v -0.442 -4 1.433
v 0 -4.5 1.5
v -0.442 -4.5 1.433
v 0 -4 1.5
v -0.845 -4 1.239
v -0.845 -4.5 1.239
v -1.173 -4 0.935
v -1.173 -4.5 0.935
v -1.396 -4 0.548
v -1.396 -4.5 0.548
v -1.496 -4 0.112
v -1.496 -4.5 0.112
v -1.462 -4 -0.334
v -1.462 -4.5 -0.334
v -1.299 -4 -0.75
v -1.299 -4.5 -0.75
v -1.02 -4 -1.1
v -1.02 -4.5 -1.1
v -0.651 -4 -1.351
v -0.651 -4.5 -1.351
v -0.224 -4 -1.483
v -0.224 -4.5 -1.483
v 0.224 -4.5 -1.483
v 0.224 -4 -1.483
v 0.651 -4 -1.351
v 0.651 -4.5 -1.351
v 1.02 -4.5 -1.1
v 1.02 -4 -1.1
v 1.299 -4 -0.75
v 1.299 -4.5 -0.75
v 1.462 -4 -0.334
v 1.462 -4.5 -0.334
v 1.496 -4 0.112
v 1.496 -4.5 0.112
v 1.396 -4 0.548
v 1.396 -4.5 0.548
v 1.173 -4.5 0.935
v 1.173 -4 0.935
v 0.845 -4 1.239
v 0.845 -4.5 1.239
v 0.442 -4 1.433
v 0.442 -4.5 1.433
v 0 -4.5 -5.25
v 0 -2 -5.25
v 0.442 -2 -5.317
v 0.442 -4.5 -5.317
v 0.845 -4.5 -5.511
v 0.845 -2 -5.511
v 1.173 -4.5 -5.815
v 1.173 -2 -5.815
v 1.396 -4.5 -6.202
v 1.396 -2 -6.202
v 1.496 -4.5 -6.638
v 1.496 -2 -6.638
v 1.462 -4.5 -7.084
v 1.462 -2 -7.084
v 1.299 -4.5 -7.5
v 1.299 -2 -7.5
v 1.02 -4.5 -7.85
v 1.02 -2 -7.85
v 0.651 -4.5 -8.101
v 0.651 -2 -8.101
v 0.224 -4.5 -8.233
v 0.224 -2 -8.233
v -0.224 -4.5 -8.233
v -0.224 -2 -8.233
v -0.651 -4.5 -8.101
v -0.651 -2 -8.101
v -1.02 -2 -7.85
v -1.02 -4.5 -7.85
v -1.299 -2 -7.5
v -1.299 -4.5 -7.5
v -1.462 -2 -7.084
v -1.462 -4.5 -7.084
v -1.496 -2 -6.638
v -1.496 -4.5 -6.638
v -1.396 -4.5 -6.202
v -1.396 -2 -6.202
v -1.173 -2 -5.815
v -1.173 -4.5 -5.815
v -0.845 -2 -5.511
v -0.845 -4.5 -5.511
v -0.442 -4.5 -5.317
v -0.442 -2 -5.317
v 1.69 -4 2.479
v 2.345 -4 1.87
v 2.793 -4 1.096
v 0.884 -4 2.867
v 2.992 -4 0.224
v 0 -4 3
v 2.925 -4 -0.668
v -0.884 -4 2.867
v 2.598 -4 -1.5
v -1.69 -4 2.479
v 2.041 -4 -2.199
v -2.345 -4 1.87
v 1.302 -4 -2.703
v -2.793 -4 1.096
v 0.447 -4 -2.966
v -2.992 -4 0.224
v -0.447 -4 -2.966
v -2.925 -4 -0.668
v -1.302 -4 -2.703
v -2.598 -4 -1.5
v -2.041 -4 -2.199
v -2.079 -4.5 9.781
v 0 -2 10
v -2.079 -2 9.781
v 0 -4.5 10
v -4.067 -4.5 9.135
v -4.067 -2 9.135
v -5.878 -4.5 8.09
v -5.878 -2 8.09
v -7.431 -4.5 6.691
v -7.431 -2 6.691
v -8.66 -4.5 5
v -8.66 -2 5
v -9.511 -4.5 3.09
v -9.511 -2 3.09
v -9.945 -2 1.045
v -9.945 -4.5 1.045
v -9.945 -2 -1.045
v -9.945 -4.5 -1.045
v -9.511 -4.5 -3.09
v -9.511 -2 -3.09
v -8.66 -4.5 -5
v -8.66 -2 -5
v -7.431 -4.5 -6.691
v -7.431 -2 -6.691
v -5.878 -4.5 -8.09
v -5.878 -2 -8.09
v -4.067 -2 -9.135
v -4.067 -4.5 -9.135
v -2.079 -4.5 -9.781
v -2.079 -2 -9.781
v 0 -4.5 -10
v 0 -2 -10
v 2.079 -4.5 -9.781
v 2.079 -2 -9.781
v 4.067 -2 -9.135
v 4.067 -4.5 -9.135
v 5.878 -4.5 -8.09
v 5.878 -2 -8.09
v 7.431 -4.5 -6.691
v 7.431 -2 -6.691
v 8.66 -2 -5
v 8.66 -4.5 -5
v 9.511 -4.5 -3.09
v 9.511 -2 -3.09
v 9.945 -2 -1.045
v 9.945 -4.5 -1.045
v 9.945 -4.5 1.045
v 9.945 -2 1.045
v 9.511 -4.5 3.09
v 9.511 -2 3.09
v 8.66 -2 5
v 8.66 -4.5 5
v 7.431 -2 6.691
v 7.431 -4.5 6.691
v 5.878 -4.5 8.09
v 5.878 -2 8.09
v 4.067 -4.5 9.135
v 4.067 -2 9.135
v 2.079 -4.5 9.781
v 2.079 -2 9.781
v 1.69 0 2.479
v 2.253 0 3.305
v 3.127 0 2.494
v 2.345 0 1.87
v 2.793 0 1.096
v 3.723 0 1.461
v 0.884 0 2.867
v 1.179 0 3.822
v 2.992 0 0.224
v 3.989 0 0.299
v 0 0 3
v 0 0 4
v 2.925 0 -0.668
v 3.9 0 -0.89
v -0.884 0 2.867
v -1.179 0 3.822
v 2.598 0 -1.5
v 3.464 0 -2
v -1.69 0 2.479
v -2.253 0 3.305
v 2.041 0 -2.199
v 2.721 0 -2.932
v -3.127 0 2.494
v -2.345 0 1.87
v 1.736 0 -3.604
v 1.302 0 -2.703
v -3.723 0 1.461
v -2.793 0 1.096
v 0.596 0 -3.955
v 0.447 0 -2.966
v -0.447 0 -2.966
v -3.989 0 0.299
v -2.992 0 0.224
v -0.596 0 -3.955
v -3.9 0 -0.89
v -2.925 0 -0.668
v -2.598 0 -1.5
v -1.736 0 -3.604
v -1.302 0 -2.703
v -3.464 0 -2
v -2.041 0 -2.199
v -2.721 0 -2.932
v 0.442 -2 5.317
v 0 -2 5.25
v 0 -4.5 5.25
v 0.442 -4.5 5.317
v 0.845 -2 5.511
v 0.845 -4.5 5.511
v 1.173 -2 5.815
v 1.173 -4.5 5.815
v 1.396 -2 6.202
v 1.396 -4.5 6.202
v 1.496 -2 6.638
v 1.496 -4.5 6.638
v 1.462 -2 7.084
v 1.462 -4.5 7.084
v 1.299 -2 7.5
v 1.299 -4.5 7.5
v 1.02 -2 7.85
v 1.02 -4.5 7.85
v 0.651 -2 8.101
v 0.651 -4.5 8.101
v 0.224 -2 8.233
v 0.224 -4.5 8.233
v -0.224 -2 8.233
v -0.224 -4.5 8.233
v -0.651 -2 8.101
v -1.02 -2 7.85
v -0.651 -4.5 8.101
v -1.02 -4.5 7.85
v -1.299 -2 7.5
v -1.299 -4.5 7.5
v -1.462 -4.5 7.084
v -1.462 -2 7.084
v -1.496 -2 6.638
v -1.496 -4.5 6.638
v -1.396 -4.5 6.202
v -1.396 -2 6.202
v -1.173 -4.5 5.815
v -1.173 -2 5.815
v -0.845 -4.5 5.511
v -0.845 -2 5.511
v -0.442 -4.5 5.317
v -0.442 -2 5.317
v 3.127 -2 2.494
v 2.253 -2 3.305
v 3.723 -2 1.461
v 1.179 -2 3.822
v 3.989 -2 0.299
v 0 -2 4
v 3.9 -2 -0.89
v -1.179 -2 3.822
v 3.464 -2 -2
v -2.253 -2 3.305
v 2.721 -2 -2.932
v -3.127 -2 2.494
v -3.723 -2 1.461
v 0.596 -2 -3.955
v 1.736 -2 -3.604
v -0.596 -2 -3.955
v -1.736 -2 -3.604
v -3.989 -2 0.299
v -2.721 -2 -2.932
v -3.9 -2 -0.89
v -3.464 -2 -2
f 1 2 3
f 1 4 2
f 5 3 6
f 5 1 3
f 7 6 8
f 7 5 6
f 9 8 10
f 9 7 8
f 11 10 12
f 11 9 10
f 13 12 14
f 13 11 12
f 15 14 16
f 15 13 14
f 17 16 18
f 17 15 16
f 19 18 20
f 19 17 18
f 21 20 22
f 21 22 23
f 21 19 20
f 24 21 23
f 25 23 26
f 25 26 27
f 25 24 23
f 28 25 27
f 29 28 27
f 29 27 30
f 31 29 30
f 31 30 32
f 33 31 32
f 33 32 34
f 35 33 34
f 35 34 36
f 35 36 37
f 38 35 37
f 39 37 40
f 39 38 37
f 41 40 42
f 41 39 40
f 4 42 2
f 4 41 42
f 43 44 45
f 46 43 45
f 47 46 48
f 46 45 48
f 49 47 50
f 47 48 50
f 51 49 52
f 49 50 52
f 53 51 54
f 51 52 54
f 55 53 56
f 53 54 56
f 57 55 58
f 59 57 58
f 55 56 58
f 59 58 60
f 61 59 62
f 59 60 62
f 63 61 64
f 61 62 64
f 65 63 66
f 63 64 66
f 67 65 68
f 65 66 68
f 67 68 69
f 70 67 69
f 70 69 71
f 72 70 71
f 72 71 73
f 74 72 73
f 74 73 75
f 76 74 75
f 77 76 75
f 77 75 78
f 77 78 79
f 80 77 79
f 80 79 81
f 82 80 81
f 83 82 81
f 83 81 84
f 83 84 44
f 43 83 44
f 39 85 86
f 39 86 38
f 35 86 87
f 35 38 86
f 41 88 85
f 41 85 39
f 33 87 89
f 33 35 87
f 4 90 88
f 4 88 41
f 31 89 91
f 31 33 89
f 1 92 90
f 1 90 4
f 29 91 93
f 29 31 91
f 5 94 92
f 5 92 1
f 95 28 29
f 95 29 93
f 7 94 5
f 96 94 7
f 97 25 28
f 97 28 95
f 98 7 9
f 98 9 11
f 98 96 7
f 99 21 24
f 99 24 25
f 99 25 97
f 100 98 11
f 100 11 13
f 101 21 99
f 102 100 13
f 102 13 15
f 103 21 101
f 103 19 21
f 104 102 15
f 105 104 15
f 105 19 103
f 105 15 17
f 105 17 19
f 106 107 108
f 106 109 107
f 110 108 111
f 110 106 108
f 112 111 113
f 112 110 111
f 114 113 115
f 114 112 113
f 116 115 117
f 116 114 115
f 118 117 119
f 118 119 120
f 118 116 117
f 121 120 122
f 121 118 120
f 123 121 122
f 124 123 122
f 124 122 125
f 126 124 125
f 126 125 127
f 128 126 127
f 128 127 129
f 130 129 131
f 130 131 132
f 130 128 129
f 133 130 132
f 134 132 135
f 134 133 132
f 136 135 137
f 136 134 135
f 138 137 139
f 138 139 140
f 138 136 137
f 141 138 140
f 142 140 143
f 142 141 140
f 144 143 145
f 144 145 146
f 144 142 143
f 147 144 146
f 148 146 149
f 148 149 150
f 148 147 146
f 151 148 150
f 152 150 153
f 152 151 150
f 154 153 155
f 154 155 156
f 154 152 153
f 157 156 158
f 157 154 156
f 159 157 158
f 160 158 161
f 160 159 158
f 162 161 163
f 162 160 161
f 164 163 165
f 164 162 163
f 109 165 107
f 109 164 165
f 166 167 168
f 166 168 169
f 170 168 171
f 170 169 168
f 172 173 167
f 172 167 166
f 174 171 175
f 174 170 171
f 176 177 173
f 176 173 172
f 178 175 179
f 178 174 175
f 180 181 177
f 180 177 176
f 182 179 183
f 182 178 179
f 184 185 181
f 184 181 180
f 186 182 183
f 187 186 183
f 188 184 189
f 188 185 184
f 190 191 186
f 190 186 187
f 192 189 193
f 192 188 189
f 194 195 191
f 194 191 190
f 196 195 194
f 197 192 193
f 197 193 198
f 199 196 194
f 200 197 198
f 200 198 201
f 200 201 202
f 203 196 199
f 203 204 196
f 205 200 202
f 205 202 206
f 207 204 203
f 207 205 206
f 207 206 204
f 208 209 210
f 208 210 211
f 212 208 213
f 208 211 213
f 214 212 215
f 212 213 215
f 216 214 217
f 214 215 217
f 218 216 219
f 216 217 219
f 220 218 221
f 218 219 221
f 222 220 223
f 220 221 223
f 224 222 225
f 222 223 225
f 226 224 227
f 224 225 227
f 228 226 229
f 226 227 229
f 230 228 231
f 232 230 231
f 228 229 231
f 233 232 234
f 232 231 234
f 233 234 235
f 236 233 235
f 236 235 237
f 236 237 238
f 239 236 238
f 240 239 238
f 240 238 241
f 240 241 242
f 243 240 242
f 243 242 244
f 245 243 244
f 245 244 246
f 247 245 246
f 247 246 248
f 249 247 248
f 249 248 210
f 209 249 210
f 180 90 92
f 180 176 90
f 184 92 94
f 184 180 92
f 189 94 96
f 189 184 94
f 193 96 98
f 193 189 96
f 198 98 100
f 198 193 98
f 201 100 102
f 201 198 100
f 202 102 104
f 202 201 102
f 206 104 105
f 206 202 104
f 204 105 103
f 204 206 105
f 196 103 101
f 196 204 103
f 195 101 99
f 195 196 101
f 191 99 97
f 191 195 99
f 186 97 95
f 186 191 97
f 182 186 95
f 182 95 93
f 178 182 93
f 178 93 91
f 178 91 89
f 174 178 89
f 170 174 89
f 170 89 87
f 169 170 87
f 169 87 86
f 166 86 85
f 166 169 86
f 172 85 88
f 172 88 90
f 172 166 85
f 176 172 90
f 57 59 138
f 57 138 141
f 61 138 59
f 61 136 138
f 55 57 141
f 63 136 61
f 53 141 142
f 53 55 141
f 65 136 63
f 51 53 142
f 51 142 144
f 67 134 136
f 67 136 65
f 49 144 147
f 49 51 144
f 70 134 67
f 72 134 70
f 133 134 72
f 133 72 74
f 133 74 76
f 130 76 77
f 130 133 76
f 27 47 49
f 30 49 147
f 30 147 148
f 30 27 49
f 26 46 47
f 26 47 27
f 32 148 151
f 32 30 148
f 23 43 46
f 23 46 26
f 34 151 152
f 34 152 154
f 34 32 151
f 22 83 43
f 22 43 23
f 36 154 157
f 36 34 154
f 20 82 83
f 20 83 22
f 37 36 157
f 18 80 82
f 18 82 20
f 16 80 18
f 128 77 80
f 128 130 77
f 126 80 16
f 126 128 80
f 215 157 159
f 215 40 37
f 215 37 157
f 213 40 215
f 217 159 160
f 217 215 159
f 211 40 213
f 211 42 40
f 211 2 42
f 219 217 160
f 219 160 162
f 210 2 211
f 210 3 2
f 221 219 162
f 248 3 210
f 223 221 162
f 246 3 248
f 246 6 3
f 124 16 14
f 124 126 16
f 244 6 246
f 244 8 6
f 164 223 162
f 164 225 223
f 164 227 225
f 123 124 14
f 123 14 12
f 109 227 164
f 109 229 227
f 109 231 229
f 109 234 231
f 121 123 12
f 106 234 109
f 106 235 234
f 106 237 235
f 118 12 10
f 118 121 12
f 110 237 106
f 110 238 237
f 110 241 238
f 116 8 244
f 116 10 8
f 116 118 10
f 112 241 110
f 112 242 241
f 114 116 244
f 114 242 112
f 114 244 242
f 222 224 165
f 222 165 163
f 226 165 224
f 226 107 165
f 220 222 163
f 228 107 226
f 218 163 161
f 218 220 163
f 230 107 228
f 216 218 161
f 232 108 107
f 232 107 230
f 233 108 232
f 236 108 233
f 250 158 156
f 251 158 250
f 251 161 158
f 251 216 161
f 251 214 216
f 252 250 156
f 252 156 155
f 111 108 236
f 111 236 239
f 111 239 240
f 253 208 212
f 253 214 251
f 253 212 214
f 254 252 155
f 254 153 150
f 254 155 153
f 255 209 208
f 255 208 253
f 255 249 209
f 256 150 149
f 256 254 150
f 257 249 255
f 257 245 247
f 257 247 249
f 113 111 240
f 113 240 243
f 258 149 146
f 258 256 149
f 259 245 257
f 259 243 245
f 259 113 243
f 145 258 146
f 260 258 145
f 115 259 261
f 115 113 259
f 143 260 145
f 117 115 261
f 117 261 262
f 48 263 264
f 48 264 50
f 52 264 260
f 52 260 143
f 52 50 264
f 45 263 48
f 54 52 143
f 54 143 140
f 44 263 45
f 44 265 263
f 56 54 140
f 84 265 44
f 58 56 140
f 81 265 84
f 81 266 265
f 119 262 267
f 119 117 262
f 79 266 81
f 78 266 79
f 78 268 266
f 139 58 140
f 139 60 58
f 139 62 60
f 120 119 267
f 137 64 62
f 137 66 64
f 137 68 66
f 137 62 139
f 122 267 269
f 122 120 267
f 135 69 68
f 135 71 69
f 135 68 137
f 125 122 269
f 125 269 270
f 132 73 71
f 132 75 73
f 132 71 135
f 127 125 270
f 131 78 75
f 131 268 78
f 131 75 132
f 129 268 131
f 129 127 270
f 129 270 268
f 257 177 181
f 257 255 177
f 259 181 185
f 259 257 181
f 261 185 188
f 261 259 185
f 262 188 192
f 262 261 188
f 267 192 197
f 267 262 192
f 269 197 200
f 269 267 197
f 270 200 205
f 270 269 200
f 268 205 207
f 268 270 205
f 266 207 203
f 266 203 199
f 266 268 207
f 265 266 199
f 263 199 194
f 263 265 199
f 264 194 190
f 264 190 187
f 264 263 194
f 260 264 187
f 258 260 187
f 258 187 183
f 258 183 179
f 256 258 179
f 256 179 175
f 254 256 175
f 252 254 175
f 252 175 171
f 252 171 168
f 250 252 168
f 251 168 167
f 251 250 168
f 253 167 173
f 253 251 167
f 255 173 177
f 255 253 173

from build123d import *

# Parameters (mm, degrees)
SKETCH4_R          = 1.5
CUT_EXTRUDE1_DEPTH = 15.361406616
CIRPATTERN1_COUNT  = 4


with BuildPart() as part:
    # Sketch1 → Revolve1 (revolve)
    with BuildSketch(Plane.XY, mode=Mode.PRIVATE) as revolve1_sk:
        Polygon((3, 0), (4, 0), (4, -2), (10, -2), (10, -4.5), (1.5, -4.5), (1.5, -4), (3, -4), align=None)
    revolve(revolve1_sk.sketch.rotate(Axis((0, 3.424478083, 0), (0, -1, 0)), 90), axis=Axis((0, 3.424478083, 0), (0, -1, 0)))

    # Sketch4 → Cut-Extrude1 (cut, through all)
    with BuildSketch(Plane(origin=(0, -2, 0), x_dir=(1, 0, 0), z_dir=(0, 1, 0))):
        with Locations(Location((0, 6.75, 0), (0, 0, 270))):
            Circle(SKETCH4_R)
    cut_extrude1 = extrude(amount=-CUT_EXTRUDE1_DEPTH, mode=Mode.SUBTRACT)

    # CirPattern1: Cut-Extrude1 ×4 about axis
    cirpattern1_axis = Axis((-7.809580464, -4.5, 0), (1, 0, 0))
    for i in range(1, CIRPATTERN1_COUNT):
        add(cut_extrude1.rotate(cirpattern1_axis, i * 360 / CIRPATTERN1_COUNT), mode=Mode.SUBTRACT)


solid = part.part
